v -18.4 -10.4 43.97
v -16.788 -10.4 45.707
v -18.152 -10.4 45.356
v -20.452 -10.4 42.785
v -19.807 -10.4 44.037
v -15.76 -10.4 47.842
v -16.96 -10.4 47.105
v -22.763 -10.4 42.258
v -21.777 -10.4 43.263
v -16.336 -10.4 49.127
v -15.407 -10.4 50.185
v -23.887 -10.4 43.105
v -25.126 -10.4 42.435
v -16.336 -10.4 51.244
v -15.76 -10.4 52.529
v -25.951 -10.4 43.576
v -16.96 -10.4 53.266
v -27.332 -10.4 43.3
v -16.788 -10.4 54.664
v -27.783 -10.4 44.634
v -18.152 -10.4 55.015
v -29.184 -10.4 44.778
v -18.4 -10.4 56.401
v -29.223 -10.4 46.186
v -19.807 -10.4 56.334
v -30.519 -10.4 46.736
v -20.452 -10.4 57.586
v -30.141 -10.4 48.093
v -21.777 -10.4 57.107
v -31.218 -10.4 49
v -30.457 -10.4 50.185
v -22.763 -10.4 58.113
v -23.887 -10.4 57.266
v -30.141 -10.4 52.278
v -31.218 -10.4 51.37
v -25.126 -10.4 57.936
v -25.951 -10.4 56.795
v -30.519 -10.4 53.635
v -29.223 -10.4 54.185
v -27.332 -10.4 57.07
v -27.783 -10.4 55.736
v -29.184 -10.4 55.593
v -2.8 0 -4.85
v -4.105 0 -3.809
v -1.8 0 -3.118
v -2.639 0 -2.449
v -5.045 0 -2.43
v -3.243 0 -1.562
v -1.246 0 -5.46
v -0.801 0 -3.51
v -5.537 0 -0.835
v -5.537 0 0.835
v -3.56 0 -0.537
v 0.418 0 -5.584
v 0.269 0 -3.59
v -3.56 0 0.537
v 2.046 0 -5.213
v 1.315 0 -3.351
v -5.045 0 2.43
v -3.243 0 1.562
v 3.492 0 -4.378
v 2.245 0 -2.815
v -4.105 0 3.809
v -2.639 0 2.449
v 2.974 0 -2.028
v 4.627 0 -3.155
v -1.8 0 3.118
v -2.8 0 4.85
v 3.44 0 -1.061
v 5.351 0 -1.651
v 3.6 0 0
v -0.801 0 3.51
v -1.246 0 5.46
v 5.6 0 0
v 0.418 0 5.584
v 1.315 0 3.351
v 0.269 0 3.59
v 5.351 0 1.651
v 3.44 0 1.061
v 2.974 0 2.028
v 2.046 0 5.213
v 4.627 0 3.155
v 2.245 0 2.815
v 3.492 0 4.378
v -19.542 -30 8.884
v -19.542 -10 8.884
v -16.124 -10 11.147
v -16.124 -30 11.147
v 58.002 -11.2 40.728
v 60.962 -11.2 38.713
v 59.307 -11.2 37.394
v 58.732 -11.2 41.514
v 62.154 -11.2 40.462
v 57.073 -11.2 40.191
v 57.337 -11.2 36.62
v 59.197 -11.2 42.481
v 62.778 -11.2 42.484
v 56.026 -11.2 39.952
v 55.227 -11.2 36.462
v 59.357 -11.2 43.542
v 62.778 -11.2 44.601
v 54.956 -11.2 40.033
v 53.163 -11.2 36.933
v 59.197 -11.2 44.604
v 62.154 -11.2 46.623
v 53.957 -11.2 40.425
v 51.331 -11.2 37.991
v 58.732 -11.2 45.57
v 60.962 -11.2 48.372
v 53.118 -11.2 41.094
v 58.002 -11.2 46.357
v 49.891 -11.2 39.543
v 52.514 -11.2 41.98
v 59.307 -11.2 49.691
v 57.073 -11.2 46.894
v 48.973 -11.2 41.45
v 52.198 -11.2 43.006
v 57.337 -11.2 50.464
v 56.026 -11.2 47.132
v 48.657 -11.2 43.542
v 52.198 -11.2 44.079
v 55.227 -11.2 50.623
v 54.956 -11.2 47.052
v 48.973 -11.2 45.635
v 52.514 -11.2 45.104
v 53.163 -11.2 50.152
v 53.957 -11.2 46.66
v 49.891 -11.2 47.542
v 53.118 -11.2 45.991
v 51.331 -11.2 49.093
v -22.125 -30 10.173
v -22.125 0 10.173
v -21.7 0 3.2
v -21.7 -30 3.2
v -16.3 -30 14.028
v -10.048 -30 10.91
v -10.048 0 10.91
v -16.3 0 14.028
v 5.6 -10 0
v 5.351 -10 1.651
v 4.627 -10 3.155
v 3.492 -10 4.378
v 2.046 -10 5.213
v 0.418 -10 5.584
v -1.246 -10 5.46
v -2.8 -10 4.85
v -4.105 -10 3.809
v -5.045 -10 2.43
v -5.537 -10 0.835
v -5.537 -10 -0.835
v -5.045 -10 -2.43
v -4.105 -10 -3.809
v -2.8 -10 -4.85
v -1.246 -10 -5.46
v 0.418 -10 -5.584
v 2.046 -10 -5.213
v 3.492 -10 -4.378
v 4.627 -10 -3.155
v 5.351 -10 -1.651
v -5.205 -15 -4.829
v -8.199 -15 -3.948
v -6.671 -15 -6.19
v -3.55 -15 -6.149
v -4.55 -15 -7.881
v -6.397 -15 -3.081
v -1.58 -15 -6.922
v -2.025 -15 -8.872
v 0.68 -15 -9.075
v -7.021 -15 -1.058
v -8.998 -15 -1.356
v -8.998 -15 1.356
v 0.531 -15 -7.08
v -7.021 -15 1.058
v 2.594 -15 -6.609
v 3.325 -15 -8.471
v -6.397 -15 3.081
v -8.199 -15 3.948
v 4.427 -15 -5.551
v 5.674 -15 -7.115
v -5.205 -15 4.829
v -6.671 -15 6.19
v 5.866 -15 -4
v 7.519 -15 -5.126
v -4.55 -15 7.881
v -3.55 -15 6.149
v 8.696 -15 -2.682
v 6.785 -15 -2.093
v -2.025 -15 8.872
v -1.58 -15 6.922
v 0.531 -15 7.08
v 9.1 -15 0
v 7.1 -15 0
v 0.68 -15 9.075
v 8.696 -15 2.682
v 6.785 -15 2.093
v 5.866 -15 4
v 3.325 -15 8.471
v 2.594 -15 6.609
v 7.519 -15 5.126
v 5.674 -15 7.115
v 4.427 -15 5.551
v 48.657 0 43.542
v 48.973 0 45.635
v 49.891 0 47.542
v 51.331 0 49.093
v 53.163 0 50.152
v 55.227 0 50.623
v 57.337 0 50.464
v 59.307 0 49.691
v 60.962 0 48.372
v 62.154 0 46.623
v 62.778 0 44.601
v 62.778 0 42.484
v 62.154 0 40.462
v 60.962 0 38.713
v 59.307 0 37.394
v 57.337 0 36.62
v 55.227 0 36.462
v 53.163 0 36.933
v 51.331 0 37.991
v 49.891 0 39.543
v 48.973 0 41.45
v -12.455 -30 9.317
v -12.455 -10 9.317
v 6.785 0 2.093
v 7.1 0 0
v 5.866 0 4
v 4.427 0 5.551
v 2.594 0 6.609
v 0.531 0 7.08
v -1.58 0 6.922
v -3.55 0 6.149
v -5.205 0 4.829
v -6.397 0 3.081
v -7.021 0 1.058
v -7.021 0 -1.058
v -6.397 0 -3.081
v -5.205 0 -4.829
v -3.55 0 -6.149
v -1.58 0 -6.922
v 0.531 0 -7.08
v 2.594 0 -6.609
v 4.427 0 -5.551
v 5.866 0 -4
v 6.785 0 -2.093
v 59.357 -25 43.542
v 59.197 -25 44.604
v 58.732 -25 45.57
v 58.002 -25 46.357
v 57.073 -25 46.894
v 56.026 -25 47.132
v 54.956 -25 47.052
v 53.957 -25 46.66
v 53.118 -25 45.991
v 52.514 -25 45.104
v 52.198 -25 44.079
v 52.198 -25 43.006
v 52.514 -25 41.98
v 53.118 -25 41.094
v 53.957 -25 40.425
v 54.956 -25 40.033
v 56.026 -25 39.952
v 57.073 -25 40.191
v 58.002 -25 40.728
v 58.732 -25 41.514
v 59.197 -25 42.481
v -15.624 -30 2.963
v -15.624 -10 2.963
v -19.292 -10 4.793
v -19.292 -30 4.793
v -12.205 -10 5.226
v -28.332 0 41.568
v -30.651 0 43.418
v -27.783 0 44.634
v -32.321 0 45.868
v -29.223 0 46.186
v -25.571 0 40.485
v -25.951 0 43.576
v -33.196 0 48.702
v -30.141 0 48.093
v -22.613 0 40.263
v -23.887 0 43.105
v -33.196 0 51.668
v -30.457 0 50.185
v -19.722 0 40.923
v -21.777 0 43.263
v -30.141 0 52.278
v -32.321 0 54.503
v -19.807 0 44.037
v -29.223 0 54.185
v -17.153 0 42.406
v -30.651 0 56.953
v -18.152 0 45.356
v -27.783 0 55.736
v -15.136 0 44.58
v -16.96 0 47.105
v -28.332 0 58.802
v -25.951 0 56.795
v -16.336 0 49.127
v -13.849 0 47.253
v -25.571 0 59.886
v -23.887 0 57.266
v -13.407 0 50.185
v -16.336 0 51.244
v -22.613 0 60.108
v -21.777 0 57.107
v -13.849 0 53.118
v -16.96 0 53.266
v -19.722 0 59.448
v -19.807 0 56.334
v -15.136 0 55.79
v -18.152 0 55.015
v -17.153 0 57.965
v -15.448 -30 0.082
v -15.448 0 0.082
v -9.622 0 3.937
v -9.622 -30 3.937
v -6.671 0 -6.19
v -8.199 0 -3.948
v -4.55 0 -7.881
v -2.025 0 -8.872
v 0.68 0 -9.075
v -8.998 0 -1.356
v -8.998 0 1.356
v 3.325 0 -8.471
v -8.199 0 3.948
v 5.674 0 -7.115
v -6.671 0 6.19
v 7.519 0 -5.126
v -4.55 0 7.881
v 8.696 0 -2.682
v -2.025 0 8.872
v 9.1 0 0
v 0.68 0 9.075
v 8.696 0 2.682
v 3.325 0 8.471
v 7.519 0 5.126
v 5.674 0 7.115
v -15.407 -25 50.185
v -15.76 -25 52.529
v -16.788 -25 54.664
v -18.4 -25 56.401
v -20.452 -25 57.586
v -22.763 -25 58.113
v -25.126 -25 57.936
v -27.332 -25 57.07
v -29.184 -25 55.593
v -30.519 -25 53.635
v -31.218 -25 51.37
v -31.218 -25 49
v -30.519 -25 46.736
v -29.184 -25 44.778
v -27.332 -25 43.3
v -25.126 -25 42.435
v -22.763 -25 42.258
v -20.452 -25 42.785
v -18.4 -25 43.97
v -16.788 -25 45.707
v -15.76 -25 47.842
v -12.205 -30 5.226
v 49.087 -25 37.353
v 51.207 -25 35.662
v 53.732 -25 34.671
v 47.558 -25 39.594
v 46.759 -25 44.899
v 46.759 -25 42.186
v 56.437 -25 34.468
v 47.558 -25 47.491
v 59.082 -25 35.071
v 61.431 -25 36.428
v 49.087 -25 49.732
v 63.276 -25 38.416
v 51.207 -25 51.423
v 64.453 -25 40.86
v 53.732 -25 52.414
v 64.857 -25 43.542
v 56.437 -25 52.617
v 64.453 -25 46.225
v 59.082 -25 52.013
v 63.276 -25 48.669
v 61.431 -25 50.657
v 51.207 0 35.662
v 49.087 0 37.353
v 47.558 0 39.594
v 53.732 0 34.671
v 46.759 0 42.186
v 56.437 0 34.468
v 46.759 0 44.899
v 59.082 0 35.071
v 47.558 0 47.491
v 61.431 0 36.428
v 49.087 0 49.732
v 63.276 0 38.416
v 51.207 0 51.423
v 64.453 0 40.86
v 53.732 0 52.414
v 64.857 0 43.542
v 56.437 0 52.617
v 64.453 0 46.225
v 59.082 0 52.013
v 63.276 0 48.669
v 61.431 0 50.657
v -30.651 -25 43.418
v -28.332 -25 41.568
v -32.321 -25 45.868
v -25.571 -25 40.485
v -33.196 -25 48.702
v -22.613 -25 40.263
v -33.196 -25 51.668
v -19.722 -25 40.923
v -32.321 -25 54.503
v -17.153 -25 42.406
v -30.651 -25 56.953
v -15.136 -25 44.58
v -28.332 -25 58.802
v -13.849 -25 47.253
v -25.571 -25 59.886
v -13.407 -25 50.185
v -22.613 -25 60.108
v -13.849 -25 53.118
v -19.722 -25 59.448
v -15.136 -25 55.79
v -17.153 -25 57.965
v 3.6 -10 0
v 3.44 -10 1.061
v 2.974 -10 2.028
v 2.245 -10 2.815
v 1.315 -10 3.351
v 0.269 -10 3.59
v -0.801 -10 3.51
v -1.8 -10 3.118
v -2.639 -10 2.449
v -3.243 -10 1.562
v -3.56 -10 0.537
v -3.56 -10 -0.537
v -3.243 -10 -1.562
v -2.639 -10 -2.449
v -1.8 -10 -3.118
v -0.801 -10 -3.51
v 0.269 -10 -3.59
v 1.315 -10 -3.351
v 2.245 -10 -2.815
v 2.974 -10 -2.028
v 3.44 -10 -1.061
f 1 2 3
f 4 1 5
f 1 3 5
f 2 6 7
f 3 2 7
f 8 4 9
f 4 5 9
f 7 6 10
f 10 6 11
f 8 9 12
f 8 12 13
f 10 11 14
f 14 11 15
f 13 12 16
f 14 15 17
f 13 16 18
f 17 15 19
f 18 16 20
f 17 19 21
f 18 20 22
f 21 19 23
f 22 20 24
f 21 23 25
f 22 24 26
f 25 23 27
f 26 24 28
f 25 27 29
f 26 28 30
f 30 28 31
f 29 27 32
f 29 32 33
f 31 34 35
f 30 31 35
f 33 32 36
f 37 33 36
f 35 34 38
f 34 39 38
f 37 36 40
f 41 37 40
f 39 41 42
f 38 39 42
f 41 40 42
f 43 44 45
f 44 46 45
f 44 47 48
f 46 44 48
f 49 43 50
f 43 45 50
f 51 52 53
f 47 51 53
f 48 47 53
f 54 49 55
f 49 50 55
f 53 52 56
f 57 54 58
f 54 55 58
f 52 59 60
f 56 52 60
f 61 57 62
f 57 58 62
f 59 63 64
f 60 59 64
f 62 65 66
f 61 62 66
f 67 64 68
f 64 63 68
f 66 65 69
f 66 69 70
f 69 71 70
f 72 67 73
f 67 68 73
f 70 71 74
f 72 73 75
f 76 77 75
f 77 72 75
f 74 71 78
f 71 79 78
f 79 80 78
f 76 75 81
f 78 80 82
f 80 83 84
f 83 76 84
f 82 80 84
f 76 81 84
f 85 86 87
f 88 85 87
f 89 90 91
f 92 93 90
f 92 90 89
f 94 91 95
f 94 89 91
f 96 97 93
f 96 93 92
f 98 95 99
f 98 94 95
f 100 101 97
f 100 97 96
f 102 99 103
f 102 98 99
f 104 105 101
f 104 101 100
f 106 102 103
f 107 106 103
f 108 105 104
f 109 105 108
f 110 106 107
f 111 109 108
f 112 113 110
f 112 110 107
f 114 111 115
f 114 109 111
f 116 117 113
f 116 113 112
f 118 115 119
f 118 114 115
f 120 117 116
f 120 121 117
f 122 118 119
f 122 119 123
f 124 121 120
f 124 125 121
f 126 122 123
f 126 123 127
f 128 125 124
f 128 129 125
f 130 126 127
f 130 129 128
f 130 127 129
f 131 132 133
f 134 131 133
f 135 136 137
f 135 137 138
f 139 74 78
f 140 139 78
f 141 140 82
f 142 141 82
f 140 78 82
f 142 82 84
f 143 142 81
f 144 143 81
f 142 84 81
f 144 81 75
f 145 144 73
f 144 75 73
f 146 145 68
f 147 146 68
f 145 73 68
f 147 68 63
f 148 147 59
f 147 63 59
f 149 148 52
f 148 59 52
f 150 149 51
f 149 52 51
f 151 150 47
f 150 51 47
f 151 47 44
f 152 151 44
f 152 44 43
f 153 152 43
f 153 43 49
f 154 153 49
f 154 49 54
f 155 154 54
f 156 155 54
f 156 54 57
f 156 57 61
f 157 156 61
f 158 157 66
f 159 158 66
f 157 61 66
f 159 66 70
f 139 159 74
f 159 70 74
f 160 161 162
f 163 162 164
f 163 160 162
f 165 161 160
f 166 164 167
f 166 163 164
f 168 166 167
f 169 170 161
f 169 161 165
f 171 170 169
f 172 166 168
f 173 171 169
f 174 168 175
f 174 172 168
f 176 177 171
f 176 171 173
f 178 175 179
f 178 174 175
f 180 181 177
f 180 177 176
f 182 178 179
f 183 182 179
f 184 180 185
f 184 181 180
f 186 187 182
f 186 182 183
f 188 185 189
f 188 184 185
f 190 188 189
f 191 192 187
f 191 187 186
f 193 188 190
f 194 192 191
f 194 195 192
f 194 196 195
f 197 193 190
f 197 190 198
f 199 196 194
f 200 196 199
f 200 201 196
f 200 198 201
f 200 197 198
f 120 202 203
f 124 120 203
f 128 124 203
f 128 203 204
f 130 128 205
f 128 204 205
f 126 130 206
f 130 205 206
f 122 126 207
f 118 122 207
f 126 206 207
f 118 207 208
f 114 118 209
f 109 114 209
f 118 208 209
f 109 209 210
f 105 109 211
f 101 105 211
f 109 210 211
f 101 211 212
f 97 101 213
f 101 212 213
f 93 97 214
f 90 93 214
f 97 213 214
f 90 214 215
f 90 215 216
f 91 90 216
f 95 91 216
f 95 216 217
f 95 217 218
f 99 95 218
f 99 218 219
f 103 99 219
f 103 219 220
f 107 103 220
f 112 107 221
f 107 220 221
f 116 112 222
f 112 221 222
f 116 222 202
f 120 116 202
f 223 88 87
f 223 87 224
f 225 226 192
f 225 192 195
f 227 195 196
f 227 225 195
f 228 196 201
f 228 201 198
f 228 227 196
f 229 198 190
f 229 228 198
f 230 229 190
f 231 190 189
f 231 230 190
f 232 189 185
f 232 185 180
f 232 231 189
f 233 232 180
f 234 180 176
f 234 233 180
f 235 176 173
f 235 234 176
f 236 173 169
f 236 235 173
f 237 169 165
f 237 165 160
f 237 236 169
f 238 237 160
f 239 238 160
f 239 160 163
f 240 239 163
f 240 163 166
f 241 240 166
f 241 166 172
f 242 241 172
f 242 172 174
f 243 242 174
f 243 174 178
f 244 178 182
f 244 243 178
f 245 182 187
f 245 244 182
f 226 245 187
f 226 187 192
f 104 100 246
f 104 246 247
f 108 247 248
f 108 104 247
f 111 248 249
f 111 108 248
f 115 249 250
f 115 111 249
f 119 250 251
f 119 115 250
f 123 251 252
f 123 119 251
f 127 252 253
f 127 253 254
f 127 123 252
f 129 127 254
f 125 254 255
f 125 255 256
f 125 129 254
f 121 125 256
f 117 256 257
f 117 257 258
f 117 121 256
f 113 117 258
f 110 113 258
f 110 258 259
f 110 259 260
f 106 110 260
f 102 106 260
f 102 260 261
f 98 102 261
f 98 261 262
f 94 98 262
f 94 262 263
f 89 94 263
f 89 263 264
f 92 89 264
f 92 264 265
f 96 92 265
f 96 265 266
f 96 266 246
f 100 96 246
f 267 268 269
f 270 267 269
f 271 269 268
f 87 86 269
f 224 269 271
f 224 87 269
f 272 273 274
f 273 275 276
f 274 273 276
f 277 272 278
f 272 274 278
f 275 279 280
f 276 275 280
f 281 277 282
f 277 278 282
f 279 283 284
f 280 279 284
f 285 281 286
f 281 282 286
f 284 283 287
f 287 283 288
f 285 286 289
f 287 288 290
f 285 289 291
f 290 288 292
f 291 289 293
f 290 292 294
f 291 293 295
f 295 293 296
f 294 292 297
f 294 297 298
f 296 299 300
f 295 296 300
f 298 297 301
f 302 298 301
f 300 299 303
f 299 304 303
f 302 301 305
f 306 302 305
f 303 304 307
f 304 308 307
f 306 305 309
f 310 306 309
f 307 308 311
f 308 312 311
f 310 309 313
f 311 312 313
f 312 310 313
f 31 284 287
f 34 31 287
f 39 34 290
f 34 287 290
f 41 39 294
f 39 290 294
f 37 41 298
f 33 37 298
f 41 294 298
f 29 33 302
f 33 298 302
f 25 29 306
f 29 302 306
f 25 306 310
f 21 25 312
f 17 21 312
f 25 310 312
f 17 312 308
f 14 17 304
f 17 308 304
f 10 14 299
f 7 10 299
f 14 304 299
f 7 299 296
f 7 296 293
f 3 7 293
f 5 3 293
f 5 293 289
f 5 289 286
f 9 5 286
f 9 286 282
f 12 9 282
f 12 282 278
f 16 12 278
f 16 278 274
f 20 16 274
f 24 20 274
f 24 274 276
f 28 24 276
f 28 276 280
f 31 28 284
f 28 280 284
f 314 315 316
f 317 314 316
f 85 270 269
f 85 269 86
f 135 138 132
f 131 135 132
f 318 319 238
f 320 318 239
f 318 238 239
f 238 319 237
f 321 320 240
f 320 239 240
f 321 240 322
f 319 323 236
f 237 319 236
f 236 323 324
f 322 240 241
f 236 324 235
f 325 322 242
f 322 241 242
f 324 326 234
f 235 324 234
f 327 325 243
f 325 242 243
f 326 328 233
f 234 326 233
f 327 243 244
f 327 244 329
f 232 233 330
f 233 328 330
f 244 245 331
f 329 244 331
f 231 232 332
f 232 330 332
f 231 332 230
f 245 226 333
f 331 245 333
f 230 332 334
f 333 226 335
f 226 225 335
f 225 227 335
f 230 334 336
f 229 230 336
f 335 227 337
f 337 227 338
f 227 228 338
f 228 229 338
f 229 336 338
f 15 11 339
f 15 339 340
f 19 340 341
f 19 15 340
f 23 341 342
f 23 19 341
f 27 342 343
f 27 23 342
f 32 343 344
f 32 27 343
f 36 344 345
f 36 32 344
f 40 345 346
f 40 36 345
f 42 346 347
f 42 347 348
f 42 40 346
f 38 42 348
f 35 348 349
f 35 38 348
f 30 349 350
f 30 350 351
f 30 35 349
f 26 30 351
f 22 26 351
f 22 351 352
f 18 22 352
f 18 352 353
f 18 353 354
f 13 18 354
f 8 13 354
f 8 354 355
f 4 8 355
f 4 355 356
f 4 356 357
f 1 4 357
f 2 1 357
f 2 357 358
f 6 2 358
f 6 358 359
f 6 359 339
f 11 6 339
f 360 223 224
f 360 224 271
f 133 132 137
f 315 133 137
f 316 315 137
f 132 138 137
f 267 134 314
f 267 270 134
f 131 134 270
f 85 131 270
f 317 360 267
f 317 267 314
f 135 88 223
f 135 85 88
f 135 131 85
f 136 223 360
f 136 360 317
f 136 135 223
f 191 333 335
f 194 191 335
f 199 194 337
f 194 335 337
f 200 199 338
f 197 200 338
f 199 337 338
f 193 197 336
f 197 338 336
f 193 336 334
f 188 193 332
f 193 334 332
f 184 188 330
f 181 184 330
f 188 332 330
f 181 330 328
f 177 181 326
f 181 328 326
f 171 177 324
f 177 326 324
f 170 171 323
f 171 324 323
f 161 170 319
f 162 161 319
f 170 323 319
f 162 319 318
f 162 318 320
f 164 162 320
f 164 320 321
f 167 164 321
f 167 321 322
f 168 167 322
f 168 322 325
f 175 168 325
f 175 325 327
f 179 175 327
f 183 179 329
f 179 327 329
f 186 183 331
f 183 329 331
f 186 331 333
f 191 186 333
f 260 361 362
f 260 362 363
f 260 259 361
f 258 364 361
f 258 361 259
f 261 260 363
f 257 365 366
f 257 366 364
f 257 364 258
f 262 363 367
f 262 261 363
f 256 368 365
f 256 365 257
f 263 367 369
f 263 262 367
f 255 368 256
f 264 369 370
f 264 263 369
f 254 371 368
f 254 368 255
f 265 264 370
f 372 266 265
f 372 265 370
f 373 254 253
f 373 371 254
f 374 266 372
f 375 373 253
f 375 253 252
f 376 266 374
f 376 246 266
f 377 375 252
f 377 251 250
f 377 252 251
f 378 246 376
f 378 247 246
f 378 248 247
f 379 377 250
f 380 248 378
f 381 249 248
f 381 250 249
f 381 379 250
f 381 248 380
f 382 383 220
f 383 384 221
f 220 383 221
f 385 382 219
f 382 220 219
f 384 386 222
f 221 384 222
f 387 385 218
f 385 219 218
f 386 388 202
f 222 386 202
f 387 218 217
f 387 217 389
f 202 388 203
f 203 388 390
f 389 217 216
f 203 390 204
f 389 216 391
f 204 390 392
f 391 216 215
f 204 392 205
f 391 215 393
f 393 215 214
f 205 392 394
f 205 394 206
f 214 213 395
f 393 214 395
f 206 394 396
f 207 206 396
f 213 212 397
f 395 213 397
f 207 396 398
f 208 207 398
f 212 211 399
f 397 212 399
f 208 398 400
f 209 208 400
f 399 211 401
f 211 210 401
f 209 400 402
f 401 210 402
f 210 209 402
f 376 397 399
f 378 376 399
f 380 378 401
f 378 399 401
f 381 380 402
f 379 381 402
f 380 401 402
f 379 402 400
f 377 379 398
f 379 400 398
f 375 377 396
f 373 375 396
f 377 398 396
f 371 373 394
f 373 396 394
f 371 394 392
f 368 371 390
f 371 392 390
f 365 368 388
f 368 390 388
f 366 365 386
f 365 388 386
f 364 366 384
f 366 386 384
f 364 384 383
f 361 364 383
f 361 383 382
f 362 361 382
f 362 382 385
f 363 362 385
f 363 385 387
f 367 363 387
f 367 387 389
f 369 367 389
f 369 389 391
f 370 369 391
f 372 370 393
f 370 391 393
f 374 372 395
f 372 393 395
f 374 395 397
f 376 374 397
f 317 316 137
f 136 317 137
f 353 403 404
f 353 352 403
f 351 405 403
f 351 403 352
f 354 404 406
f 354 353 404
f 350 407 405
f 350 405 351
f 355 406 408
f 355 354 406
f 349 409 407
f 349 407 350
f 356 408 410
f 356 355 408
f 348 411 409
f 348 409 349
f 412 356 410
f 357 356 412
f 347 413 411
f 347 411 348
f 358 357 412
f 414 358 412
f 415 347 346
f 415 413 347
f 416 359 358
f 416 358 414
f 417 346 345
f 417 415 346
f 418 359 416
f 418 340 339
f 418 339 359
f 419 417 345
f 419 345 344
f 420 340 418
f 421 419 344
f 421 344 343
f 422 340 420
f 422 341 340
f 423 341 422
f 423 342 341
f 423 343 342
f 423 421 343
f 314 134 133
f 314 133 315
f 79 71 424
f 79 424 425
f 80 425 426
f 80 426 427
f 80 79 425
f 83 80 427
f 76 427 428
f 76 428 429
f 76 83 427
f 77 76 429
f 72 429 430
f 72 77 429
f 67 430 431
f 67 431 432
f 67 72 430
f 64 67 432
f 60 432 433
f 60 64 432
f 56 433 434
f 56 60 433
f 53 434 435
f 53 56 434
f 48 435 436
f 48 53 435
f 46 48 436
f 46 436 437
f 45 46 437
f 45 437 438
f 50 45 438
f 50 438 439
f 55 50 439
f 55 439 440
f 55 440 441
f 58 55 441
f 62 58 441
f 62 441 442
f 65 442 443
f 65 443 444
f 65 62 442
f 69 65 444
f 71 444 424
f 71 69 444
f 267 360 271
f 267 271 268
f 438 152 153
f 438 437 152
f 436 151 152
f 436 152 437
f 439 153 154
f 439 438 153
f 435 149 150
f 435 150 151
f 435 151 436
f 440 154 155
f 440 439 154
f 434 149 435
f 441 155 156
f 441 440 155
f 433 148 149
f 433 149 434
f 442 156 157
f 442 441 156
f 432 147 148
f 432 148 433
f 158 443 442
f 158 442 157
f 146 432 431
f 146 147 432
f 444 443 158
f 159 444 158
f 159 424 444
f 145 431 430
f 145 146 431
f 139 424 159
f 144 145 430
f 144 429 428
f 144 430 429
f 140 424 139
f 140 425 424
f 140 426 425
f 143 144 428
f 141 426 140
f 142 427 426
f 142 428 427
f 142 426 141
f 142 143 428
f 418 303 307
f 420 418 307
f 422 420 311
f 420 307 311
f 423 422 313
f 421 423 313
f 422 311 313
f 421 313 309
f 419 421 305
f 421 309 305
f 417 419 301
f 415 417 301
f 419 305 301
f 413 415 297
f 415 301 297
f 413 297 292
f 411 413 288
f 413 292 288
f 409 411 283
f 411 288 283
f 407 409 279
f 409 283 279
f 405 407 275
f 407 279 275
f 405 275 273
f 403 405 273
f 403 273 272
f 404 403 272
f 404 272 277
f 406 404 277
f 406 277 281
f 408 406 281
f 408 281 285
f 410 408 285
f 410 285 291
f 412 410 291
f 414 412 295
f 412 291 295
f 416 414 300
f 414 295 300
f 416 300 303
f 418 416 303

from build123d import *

# Parameters (mm, degrees)
F1_DEPTH  = 30
F2_DEPTH  = 10
F3_R      = 5.6
F3_R_2    = 3.6
F4_DEPTH  = 10
F5_R      = 9.1
F5_R_2    = 7.1
F6_DEPTH  = 15
F7_R      = 9.1
F7_R_2    = 7.1
F7_R_3    = 3.6
F8_DEPTH  = 25
F9_R      = 7.1
F9_R_2    = 3.6
F10_DEPTH = 11.2
F11_R     = 9.95
F11_R_2   = 7.95
F12_DEPTH = 25
F13_R     = 8.00000038
F13_R_2   = 7.1
F14_DEPTH = 10.4


# Not quite as in the source:
# - a feature of the source that left no trace in its solid (it failed there, or was rolled back) is left out


with BuildPart() as f1:
    # F0 (on Front) → F1 (new body)
    with BuildSketch(Plane.XZ):
        Polygon((-22.125422674, 10.1726256458), (-21.6995270296, 3.1996817744), (-15.4478326757, 0.0820462861), (-9.622033966, 3.9373546692), (-10.0479296104, 10.9102985405), (-16.2996239644, 14.0279340289), align=None)
        Polygon((-12.4552844491, 9.3171959029), (-12.2053787404, 5.2256337966), (-15.6238226113, 2.9634280511), (-19.2921721909, 4.7927844121), (-19.5420778996, 8.8843465184), (-16.1236340287, 11.1465522638), align=None, mode=Mode.SUBTRACT)
    extrude(amount=F1_DEPTH)

    # F0 (on Front) → F2 (join)
    with BuildSketch(Plane.XZ):
        Polygon((-15.6238226113, 2.9634280511), (-12.2053787404, 5.2256337966), (-12.4552844491, 9.3171959029), (-16.1236340287, 11.1465522638), (-19.5420778996, 8.8843465184), (-19.2921721909, 4.7927844121), align=None)
    extrude(amount=F2_DEPTH)


with BuildPart() as f4:
    # F3 (on Front) → F4 (new body)
    with BuildSketch(Plane.XZ):
        Circle(F3_R)
        Circle(F3_R_2, mode=Mode.SUBTRACT)
    extrude(amount=F4_DEPTH)


with BuildPart() as f6:
    # F5 (on Front) → F6 (new body)
    with BuildSketch(Plane.XZ):
        Circle(F5_R)
        Circle(F5_R_2, mode=Mode.SUBTRACT)
    extrude(amount=F6_DEPTH)


with BuildPart() as f8:
    # F7 (on Front) → F8 (new body)
    with BuildSketch(Plane.XZ):
        with Locations((55.7573027909, 43.5424260795)):
            Circle(F7_R)
        with Locations((55.7573027909, 43.5424260795)):
            Circle(F7_R_2, mode=Mode.SUBTRACT)
        with Locations((55.7573027909, 43.5424260795)):
            Circle(F7_R_2)
        with Locations((55.7573027909, 43.5424260795)):
            Circle(F7_R_3, mode=Mode.SUBTRACT)
    extrude(amount=F8_DEPTH)

    # F9 (on face) → F10 (cut)
    with BuildSketch(Plane(origin=(0, 0, 0), x_dir=(-1, 0, 0), z_dir=(0, 1, 0))):
        with Locations((-55.7573027909, 43.5424260795)):
            Circle(F9_R)
        with Locations((-55.7573027909, 43.5424260795)):
            Circle(F9_R_2, mode=Mode.SUBTRACT)
    extrude(amount=-F10_DEPTH, mode=Mode.SUBTRACT)


with BuildPart() as f12:
    # F11 (on Front) → F12 (new body)
    with BuildSketch(Plane.XZ):
        with Locations((-23.3567170799, 50.1853749156)):
            Circle(F11_R)
        with Locations((-23.3567170799, 50.1853749156)):
            Circle(F11_R_2, mode=Mode.SUBTRACT)
    extrude(amount=F12_DEPTH)

    # F13 (on face) → F14 (join)
    with BuildSketch(Plane(origin=(0, 0, 0), x_dir=(-1, 0, 0), z_dir=(0, 1, 0))):
        with Locations((23.3567170799, 50.1853749156)):
            Circle(F13_R)
        with Locations((23.3567170799, 50.1853749156)):
            Circle(F13_R_2, mode=Mode.SUBTRACT)
    extrude(amount=-F14_DEPTH)


solid = Compound([f1.part, f4.part, f6.part, f8.part, f12.part])
